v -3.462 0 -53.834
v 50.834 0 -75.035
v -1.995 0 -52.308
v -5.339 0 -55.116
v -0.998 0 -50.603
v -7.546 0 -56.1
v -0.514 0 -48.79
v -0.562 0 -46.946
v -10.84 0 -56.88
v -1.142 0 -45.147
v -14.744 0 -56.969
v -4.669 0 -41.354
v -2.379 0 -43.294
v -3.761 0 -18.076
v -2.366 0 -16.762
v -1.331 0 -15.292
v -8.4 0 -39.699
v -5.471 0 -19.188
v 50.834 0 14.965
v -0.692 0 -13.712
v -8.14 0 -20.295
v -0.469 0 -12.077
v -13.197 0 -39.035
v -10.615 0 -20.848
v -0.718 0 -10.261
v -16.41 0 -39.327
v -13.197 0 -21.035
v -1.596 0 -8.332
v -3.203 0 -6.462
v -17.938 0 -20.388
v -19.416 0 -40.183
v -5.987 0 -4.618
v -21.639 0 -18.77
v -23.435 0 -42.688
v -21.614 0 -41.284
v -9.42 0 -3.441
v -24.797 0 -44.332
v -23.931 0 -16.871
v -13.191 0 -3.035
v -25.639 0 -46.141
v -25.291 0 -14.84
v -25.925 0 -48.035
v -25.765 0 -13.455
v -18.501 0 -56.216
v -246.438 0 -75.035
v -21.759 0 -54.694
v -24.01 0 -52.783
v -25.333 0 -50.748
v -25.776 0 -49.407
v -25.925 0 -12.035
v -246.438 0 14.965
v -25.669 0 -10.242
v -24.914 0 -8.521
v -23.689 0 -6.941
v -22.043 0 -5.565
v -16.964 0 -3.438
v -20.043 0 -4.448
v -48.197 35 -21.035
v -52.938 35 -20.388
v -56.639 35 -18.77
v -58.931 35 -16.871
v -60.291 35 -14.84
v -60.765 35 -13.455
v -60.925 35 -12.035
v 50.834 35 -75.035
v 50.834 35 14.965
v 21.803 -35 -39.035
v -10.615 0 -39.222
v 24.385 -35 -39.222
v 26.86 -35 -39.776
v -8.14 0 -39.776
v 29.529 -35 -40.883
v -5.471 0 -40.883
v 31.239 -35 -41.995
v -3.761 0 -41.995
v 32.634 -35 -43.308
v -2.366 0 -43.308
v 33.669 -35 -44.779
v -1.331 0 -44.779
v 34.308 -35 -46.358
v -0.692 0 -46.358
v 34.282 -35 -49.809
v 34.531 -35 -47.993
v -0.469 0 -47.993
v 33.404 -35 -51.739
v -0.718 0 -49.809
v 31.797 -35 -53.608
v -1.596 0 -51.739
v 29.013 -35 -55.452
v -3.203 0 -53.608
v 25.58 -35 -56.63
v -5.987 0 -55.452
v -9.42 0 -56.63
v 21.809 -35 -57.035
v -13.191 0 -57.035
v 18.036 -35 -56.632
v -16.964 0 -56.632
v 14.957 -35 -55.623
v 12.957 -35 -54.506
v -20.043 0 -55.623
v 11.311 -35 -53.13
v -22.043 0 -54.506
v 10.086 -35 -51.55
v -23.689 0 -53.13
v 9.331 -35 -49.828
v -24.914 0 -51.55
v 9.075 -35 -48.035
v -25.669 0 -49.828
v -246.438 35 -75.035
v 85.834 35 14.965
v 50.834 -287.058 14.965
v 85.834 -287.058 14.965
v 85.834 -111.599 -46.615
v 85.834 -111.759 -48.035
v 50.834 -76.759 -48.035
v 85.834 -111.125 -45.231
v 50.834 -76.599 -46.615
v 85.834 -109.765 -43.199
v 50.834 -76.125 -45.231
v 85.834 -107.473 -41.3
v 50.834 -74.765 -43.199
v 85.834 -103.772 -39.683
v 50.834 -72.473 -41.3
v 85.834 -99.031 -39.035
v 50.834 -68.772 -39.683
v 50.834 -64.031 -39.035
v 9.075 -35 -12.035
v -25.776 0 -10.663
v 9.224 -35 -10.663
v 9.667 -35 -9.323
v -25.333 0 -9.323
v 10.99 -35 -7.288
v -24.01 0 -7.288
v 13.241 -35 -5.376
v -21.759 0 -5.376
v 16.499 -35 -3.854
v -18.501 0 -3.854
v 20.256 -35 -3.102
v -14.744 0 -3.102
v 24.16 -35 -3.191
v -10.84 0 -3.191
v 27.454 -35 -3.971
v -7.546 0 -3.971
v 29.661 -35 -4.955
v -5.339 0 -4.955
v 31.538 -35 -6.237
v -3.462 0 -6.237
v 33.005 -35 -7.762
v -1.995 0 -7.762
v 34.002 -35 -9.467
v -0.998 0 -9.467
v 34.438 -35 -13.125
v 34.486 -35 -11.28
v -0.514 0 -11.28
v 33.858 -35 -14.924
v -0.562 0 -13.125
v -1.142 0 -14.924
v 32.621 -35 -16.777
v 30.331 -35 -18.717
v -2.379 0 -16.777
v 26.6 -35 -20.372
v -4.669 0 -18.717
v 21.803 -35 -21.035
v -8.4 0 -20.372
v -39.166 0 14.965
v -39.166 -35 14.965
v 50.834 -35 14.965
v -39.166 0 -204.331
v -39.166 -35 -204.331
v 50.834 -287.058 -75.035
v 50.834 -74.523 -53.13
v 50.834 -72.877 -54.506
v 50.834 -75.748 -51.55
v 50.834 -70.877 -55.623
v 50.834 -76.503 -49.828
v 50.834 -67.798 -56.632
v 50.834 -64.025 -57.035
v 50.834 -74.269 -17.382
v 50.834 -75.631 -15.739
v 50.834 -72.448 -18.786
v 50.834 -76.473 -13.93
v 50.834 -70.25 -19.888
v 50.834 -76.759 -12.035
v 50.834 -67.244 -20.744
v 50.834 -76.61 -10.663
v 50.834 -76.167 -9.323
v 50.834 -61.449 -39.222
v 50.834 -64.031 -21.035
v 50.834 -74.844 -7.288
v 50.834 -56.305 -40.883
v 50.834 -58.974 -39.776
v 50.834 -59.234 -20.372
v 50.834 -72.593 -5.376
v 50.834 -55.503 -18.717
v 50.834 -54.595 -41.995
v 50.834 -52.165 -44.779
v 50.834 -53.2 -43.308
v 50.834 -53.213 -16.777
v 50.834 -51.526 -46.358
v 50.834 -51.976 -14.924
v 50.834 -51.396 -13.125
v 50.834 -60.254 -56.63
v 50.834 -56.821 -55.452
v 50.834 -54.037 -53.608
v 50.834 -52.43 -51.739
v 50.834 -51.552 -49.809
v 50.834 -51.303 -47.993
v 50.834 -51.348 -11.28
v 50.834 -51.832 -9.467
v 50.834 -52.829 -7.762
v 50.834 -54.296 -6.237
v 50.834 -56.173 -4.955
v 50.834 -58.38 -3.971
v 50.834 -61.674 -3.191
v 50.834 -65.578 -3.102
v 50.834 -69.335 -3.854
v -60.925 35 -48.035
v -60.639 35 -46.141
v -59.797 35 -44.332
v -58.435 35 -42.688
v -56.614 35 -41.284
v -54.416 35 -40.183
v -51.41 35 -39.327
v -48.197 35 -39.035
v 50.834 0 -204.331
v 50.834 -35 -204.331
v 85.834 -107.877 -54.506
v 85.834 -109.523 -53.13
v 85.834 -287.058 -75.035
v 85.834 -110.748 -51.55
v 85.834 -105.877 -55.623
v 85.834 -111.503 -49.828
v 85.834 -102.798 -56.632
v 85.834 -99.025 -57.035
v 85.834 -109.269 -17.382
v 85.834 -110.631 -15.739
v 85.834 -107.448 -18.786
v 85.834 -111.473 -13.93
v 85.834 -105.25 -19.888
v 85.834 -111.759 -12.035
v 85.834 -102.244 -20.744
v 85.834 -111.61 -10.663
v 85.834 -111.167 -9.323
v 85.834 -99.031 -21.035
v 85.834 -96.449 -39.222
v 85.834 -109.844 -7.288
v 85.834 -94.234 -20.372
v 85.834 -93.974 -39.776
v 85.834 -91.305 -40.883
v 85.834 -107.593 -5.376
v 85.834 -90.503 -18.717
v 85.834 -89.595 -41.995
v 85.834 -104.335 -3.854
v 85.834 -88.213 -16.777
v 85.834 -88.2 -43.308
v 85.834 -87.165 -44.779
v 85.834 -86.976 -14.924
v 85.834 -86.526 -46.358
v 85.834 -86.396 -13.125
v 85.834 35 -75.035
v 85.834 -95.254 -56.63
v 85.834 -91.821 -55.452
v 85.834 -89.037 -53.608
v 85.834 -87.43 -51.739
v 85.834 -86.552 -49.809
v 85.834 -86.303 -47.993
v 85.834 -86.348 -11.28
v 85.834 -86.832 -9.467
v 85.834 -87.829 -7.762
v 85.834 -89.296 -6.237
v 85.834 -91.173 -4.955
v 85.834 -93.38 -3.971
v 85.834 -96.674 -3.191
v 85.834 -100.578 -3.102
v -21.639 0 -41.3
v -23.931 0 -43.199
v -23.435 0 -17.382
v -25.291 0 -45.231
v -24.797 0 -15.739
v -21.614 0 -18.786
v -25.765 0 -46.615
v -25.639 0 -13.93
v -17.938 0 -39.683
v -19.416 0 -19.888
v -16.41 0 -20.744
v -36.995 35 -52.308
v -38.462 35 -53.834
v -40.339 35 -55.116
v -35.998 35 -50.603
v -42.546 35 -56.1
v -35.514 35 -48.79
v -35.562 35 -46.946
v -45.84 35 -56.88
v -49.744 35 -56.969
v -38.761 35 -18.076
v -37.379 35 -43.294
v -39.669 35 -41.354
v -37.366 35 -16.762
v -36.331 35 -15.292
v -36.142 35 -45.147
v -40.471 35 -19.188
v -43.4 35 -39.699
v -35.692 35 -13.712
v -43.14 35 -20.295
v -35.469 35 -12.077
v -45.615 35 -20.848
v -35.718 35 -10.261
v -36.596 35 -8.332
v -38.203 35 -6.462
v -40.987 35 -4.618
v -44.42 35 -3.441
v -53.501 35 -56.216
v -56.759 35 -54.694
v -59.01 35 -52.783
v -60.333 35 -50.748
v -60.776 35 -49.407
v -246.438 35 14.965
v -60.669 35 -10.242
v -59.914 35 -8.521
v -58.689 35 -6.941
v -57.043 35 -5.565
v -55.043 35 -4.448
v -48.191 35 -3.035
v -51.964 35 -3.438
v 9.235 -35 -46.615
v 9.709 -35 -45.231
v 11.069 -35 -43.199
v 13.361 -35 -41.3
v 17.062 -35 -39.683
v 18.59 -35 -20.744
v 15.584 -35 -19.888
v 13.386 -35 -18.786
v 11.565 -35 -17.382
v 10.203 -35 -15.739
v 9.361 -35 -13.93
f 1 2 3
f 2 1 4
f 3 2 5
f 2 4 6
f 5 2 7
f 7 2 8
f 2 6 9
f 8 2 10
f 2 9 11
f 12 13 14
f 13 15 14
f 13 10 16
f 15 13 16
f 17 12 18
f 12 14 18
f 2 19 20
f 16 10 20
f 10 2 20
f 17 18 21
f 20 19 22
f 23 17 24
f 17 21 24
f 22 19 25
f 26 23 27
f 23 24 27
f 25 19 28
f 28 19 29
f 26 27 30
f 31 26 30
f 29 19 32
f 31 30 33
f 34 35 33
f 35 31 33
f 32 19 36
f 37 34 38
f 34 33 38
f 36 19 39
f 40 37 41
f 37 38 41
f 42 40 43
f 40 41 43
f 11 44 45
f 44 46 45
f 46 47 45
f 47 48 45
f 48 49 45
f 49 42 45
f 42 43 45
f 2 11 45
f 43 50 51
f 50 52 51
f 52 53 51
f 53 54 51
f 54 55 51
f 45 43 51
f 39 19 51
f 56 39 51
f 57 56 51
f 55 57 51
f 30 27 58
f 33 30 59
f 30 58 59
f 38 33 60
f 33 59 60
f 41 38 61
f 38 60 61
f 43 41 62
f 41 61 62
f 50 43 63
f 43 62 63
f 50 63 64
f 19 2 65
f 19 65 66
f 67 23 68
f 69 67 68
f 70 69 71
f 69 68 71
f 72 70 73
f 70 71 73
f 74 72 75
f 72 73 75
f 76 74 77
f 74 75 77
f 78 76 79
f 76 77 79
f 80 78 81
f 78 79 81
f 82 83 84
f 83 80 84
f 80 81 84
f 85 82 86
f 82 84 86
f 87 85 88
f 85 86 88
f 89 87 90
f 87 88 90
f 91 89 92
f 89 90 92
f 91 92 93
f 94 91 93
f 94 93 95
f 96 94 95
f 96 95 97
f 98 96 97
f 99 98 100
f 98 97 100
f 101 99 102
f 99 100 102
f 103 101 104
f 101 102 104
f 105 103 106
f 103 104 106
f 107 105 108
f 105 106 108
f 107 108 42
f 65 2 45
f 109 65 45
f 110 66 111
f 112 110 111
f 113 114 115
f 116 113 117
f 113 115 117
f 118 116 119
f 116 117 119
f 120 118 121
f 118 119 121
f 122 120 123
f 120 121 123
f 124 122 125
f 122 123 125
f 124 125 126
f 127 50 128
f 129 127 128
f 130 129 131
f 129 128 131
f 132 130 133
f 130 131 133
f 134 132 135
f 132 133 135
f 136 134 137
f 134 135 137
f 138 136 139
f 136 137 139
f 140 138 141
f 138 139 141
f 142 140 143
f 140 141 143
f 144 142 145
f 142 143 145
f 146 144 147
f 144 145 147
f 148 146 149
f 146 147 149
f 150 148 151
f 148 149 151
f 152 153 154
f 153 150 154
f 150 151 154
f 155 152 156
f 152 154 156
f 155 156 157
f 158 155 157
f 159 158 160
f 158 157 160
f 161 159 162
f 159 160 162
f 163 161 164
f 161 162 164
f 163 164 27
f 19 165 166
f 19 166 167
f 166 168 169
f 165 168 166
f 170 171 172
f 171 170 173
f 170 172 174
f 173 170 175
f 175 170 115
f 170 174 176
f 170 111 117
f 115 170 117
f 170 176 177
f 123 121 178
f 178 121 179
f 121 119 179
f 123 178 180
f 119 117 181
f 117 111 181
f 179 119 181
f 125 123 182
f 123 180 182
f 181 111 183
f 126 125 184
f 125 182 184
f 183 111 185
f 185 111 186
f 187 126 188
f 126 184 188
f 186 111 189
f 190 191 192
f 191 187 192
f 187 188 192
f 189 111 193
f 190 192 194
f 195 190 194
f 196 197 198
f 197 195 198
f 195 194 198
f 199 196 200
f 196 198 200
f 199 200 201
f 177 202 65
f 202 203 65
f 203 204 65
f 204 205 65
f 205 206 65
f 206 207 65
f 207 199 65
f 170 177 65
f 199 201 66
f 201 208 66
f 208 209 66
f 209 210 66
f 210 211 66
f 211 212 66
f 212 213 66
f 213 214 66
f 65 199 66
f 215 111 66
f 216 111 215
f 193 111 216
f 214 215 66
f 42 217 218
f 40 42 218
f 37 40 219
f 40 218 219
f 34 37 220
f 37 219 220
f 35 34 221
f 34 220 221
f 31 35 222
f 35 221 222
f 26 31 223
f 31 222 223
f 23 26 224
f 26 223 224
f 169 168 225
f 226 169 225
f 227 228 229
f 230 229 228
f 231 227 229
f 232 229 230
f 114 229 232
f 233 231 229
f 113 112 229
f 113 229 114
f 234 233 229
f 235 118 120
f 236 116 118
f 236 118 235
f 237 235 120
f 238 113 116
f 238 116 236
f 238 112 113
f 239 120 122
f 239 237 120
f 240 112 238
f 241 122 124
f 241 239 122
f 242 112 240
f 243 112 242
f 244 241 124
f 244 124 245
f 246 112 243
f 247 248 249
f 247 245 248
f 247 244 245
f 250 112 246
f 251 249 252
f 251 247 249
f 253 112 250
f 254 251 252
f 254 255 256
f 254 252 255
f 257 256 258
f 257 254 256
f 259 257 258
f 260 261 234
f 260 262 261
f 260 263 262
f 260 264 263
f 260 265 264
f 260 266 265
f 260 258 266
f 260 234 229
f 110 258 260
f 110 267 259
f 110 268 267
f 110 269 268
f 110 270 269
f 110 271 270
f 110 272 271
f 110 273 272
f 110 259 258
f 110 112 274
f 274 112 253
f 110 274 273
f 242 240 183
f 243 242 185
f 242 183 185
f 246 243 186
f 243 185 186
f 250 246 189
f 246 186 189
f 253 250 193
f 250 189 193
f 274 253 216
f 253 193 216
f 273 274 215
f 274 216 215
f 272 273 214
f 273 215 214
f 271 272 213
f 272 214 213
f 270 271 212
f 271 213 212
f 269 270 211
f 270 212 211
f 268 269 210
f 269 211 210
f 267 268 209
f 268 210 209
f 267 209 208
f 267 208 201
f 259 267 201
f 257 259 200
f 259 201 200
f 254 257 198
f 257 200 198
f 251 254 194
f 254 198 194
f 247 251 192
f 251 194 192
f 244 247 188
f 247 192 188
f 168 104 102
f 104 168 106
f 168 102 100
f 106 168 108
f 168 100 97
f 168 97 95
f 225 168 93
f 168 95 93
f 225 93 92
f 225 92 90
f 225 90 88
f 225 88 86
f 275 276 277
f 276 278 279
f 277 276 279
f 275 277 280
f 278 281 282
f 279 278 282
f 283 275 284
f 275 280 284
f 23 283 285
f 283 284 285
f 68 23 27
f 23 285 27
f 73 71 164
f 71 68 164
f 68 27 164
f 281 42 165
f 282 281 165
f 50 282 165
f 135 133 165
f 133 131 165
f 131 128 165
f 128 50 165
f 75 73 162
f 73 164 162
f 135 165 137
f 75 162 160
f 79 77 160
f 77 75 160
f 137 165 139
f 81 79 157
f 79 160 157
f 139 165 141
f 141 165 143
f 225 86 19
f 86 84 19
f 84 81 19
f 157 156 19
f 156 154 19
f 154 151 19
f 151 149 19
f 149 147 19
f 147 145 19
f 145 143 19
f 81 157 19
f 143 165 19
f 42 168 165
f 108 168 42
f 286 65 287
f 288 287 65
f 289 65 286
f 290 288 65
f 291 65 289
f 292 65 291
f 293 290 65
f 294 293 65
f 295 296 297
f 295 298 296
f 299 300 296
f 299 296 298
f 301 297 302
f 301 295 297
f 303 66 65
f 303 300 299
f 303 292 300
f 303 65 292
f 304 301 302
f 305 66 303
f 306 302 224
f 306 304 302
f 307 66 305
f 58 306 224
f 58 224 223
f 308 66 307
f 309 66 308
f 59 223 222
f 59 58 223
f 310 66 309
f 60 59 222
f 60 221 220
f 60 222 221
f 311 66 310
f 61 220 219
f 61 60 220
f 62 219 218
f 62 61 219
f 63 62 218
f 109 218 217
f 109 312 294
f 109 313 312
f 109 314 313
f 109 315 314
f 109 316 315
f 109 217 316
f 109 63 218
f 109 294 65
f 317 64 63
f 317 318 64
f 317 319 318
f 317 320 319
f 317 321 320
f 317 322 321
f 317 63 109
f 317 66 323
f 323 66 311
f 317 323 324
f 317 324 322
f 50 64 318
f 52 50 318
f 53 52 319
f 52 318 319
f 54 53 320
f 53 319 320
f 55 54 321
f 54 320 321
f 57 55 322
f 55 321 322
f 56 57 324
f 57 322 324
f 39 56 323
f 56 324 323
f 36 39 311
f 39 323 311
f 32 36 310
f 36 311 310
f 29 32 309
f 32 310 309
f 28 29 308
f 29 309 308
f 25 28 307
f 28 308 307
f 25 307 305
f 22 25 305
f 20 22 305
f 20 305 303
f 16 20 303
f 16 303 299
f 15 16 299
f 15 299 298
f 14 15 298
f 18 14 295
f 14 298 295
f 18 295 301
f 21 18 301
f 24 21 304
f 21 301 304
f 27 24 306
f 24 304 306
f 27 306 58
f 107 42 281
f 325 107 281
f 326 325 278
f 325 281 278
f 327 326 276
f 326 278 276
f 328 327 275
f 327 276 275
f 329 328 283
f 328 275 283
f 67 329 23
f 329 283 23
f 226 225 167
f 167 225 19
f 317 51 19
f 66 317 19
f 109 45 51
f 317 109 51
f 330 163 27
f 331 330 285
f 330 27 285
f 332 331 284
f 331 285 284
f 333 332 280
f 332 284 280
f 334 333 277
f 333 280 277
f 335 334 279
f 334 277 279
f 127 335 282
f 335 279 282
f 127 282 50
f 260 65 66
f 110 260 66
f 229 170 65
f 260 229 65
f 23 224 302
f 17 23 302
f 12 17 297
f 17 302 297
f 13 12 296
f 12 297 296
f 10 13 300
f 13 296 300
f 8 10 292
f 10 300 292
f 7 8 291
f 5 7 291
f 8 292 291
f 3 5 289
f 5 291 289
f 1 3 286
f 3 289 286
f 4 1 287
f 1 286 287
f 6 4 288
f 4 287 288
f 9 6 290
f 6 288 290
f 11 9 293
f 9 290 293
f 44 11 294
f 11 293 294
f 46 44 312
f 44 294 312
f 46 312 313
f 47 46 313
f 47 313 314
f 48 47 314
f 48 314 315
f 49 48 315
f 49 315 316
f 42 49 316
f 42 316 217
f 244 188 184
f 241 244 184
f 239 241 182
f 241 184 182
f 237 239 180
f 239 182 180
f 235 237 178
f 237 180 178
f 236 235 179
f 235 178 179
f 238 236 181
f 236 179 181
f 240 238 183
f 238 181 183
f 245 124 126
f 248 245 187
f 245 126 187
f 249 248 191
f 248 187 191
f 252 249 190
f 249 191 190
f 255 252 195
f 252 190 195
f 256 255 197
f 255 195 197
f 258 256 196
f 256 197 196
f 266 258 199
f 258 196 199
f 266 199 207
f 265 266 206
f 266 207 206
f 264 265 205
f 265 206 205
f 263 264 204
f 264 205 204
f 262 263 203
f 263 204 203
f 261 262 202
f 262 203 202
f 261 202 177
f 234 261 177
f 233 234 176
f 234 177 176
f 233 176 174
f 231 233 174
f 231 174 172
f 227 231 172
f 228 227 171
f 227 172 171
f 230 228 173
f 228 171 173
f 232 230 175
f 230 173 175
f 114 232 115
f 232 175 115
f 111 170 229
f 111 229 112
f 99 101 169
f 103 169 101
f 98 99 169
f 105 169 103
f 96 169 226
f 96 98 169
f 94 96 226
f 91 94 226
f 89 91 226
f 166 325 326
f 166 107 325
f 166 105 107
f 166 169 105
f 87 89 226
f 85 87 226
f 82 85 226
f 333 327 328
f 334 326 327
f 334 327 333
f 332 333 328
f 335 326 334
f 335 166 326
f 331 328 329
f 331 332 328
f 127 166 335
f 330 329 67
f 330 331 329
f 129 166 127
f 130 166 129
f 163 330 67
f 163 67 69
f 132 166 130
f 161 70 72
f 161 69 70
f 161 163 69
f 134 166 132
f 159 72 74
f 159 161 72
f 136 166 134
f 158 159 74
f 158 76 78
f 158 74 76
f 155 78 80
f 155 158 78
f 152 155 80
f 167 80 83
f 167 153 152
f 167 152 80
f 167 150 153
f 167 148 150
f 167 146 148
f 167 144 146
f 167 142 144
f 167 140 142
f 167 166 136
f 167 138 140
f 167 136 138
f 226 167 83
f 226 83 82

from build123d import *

# Parameters (mm, degrees)
F0_W          = 90
F0_H          = 219.295638
F1_DEPTH      = 35
F2_W          = 207.272247
F2_H          = 90
F2_W_2        = 90
F3_DEPTH      = 35
F4_W          = 35
F4_H          = 90
F4_W_2        = 287.05842
F5_DEPTH      = 35
F9_DEPTH      = 25
F9_DEPTH_BACK = 205.408499


with BuildPart() as f1:
    # F0 (on Front) → F1 (new body)
    with BuildSketch(Plane.XZ):
        with Locations((5.833983, -94.683118)):
            Rectangle(F0_W, F0_H)
    extrude(amount=F1_DEPTH)


with BuildPart() as f3:
    # F2 (on face) → F3 (new body)
    with BuildSketch(Plane(origin=(0, 0, 0), x_dir=(-1, 0, 0), z_dir=(0, 1, 0))):
        with Locations((142.80214, -30.035299)):
            Rectangle(F2_W, F2_H)
        with Locations((-5.833983, -30.035299)):
            Rectangle(F2_W_2, F2_H)
    extrude(amount=F3_DEPTH)


with BuildPart() as f5:
    # F4 (on face) → F5 (new body)
    with BuildSketch(Plane.YZ.offset(50.833983)):
        with Locations((17.5, -30.035299)):
            Rectangle(F4_W, F4_H)
        with Locations((-143.52921, -30.035299)):
            Rectangle(F4_W_2, F4_H)
    extrude(amount=F5_DEPTH)


with BuildPart() as f9_tool:
    # F8 (on face) → F9 (new body, two sides)
    with BuildSketch(Plane(origin=(-41.598333, 41.598333, 0), x_dir=(-0.707107, -0.707107, 0), z_dir=(-0.707107, 0.707107, 0))) as f9_sk:
        with BuildLine():
            ThreePointArc((9.331452, -21.035299), (15.695413, -18.39926), (18.331452, -12.035299))
            ThreePointArc((18.331452, -12.035299), (2.967491, -5.671338), (9.331452, -21.035299))
        make_face()
        with BuildLine():
            ThreePointArc((18.331452, -48.035299), (15.695413, -41.671338), (9.331452, -39.035299))
            ThreePointArc((9.331452, -39.035299), (2.967491, -54.39926), (18.331452, -48.035299))
        make_face()
    extrude(amount=F9_DEPTH)
    extrude(f9_sk.sketch, amount=-F9_DEPTH_BACK)


with BuildPart() as f1_1:
    add(f1.part)

    # F9: cut by f9_tool
    add(f9_tool.part, mode=Mode.SUBTRACT)


with BuildPart() as f3_1:
    add(f3.part)

    # F9: cut by f9_tool
    add(f9_tool.part, mode=Mode.SUBTRACT)


with BuildPart() as f5_1:
    add(f5.part)

    # F9: cut by f9_tool
    add(f9_tool.part, mode=Mode.SUBTRACT)


solid = Compound([f1_1.part, f3_1.part, f5_1.part])
